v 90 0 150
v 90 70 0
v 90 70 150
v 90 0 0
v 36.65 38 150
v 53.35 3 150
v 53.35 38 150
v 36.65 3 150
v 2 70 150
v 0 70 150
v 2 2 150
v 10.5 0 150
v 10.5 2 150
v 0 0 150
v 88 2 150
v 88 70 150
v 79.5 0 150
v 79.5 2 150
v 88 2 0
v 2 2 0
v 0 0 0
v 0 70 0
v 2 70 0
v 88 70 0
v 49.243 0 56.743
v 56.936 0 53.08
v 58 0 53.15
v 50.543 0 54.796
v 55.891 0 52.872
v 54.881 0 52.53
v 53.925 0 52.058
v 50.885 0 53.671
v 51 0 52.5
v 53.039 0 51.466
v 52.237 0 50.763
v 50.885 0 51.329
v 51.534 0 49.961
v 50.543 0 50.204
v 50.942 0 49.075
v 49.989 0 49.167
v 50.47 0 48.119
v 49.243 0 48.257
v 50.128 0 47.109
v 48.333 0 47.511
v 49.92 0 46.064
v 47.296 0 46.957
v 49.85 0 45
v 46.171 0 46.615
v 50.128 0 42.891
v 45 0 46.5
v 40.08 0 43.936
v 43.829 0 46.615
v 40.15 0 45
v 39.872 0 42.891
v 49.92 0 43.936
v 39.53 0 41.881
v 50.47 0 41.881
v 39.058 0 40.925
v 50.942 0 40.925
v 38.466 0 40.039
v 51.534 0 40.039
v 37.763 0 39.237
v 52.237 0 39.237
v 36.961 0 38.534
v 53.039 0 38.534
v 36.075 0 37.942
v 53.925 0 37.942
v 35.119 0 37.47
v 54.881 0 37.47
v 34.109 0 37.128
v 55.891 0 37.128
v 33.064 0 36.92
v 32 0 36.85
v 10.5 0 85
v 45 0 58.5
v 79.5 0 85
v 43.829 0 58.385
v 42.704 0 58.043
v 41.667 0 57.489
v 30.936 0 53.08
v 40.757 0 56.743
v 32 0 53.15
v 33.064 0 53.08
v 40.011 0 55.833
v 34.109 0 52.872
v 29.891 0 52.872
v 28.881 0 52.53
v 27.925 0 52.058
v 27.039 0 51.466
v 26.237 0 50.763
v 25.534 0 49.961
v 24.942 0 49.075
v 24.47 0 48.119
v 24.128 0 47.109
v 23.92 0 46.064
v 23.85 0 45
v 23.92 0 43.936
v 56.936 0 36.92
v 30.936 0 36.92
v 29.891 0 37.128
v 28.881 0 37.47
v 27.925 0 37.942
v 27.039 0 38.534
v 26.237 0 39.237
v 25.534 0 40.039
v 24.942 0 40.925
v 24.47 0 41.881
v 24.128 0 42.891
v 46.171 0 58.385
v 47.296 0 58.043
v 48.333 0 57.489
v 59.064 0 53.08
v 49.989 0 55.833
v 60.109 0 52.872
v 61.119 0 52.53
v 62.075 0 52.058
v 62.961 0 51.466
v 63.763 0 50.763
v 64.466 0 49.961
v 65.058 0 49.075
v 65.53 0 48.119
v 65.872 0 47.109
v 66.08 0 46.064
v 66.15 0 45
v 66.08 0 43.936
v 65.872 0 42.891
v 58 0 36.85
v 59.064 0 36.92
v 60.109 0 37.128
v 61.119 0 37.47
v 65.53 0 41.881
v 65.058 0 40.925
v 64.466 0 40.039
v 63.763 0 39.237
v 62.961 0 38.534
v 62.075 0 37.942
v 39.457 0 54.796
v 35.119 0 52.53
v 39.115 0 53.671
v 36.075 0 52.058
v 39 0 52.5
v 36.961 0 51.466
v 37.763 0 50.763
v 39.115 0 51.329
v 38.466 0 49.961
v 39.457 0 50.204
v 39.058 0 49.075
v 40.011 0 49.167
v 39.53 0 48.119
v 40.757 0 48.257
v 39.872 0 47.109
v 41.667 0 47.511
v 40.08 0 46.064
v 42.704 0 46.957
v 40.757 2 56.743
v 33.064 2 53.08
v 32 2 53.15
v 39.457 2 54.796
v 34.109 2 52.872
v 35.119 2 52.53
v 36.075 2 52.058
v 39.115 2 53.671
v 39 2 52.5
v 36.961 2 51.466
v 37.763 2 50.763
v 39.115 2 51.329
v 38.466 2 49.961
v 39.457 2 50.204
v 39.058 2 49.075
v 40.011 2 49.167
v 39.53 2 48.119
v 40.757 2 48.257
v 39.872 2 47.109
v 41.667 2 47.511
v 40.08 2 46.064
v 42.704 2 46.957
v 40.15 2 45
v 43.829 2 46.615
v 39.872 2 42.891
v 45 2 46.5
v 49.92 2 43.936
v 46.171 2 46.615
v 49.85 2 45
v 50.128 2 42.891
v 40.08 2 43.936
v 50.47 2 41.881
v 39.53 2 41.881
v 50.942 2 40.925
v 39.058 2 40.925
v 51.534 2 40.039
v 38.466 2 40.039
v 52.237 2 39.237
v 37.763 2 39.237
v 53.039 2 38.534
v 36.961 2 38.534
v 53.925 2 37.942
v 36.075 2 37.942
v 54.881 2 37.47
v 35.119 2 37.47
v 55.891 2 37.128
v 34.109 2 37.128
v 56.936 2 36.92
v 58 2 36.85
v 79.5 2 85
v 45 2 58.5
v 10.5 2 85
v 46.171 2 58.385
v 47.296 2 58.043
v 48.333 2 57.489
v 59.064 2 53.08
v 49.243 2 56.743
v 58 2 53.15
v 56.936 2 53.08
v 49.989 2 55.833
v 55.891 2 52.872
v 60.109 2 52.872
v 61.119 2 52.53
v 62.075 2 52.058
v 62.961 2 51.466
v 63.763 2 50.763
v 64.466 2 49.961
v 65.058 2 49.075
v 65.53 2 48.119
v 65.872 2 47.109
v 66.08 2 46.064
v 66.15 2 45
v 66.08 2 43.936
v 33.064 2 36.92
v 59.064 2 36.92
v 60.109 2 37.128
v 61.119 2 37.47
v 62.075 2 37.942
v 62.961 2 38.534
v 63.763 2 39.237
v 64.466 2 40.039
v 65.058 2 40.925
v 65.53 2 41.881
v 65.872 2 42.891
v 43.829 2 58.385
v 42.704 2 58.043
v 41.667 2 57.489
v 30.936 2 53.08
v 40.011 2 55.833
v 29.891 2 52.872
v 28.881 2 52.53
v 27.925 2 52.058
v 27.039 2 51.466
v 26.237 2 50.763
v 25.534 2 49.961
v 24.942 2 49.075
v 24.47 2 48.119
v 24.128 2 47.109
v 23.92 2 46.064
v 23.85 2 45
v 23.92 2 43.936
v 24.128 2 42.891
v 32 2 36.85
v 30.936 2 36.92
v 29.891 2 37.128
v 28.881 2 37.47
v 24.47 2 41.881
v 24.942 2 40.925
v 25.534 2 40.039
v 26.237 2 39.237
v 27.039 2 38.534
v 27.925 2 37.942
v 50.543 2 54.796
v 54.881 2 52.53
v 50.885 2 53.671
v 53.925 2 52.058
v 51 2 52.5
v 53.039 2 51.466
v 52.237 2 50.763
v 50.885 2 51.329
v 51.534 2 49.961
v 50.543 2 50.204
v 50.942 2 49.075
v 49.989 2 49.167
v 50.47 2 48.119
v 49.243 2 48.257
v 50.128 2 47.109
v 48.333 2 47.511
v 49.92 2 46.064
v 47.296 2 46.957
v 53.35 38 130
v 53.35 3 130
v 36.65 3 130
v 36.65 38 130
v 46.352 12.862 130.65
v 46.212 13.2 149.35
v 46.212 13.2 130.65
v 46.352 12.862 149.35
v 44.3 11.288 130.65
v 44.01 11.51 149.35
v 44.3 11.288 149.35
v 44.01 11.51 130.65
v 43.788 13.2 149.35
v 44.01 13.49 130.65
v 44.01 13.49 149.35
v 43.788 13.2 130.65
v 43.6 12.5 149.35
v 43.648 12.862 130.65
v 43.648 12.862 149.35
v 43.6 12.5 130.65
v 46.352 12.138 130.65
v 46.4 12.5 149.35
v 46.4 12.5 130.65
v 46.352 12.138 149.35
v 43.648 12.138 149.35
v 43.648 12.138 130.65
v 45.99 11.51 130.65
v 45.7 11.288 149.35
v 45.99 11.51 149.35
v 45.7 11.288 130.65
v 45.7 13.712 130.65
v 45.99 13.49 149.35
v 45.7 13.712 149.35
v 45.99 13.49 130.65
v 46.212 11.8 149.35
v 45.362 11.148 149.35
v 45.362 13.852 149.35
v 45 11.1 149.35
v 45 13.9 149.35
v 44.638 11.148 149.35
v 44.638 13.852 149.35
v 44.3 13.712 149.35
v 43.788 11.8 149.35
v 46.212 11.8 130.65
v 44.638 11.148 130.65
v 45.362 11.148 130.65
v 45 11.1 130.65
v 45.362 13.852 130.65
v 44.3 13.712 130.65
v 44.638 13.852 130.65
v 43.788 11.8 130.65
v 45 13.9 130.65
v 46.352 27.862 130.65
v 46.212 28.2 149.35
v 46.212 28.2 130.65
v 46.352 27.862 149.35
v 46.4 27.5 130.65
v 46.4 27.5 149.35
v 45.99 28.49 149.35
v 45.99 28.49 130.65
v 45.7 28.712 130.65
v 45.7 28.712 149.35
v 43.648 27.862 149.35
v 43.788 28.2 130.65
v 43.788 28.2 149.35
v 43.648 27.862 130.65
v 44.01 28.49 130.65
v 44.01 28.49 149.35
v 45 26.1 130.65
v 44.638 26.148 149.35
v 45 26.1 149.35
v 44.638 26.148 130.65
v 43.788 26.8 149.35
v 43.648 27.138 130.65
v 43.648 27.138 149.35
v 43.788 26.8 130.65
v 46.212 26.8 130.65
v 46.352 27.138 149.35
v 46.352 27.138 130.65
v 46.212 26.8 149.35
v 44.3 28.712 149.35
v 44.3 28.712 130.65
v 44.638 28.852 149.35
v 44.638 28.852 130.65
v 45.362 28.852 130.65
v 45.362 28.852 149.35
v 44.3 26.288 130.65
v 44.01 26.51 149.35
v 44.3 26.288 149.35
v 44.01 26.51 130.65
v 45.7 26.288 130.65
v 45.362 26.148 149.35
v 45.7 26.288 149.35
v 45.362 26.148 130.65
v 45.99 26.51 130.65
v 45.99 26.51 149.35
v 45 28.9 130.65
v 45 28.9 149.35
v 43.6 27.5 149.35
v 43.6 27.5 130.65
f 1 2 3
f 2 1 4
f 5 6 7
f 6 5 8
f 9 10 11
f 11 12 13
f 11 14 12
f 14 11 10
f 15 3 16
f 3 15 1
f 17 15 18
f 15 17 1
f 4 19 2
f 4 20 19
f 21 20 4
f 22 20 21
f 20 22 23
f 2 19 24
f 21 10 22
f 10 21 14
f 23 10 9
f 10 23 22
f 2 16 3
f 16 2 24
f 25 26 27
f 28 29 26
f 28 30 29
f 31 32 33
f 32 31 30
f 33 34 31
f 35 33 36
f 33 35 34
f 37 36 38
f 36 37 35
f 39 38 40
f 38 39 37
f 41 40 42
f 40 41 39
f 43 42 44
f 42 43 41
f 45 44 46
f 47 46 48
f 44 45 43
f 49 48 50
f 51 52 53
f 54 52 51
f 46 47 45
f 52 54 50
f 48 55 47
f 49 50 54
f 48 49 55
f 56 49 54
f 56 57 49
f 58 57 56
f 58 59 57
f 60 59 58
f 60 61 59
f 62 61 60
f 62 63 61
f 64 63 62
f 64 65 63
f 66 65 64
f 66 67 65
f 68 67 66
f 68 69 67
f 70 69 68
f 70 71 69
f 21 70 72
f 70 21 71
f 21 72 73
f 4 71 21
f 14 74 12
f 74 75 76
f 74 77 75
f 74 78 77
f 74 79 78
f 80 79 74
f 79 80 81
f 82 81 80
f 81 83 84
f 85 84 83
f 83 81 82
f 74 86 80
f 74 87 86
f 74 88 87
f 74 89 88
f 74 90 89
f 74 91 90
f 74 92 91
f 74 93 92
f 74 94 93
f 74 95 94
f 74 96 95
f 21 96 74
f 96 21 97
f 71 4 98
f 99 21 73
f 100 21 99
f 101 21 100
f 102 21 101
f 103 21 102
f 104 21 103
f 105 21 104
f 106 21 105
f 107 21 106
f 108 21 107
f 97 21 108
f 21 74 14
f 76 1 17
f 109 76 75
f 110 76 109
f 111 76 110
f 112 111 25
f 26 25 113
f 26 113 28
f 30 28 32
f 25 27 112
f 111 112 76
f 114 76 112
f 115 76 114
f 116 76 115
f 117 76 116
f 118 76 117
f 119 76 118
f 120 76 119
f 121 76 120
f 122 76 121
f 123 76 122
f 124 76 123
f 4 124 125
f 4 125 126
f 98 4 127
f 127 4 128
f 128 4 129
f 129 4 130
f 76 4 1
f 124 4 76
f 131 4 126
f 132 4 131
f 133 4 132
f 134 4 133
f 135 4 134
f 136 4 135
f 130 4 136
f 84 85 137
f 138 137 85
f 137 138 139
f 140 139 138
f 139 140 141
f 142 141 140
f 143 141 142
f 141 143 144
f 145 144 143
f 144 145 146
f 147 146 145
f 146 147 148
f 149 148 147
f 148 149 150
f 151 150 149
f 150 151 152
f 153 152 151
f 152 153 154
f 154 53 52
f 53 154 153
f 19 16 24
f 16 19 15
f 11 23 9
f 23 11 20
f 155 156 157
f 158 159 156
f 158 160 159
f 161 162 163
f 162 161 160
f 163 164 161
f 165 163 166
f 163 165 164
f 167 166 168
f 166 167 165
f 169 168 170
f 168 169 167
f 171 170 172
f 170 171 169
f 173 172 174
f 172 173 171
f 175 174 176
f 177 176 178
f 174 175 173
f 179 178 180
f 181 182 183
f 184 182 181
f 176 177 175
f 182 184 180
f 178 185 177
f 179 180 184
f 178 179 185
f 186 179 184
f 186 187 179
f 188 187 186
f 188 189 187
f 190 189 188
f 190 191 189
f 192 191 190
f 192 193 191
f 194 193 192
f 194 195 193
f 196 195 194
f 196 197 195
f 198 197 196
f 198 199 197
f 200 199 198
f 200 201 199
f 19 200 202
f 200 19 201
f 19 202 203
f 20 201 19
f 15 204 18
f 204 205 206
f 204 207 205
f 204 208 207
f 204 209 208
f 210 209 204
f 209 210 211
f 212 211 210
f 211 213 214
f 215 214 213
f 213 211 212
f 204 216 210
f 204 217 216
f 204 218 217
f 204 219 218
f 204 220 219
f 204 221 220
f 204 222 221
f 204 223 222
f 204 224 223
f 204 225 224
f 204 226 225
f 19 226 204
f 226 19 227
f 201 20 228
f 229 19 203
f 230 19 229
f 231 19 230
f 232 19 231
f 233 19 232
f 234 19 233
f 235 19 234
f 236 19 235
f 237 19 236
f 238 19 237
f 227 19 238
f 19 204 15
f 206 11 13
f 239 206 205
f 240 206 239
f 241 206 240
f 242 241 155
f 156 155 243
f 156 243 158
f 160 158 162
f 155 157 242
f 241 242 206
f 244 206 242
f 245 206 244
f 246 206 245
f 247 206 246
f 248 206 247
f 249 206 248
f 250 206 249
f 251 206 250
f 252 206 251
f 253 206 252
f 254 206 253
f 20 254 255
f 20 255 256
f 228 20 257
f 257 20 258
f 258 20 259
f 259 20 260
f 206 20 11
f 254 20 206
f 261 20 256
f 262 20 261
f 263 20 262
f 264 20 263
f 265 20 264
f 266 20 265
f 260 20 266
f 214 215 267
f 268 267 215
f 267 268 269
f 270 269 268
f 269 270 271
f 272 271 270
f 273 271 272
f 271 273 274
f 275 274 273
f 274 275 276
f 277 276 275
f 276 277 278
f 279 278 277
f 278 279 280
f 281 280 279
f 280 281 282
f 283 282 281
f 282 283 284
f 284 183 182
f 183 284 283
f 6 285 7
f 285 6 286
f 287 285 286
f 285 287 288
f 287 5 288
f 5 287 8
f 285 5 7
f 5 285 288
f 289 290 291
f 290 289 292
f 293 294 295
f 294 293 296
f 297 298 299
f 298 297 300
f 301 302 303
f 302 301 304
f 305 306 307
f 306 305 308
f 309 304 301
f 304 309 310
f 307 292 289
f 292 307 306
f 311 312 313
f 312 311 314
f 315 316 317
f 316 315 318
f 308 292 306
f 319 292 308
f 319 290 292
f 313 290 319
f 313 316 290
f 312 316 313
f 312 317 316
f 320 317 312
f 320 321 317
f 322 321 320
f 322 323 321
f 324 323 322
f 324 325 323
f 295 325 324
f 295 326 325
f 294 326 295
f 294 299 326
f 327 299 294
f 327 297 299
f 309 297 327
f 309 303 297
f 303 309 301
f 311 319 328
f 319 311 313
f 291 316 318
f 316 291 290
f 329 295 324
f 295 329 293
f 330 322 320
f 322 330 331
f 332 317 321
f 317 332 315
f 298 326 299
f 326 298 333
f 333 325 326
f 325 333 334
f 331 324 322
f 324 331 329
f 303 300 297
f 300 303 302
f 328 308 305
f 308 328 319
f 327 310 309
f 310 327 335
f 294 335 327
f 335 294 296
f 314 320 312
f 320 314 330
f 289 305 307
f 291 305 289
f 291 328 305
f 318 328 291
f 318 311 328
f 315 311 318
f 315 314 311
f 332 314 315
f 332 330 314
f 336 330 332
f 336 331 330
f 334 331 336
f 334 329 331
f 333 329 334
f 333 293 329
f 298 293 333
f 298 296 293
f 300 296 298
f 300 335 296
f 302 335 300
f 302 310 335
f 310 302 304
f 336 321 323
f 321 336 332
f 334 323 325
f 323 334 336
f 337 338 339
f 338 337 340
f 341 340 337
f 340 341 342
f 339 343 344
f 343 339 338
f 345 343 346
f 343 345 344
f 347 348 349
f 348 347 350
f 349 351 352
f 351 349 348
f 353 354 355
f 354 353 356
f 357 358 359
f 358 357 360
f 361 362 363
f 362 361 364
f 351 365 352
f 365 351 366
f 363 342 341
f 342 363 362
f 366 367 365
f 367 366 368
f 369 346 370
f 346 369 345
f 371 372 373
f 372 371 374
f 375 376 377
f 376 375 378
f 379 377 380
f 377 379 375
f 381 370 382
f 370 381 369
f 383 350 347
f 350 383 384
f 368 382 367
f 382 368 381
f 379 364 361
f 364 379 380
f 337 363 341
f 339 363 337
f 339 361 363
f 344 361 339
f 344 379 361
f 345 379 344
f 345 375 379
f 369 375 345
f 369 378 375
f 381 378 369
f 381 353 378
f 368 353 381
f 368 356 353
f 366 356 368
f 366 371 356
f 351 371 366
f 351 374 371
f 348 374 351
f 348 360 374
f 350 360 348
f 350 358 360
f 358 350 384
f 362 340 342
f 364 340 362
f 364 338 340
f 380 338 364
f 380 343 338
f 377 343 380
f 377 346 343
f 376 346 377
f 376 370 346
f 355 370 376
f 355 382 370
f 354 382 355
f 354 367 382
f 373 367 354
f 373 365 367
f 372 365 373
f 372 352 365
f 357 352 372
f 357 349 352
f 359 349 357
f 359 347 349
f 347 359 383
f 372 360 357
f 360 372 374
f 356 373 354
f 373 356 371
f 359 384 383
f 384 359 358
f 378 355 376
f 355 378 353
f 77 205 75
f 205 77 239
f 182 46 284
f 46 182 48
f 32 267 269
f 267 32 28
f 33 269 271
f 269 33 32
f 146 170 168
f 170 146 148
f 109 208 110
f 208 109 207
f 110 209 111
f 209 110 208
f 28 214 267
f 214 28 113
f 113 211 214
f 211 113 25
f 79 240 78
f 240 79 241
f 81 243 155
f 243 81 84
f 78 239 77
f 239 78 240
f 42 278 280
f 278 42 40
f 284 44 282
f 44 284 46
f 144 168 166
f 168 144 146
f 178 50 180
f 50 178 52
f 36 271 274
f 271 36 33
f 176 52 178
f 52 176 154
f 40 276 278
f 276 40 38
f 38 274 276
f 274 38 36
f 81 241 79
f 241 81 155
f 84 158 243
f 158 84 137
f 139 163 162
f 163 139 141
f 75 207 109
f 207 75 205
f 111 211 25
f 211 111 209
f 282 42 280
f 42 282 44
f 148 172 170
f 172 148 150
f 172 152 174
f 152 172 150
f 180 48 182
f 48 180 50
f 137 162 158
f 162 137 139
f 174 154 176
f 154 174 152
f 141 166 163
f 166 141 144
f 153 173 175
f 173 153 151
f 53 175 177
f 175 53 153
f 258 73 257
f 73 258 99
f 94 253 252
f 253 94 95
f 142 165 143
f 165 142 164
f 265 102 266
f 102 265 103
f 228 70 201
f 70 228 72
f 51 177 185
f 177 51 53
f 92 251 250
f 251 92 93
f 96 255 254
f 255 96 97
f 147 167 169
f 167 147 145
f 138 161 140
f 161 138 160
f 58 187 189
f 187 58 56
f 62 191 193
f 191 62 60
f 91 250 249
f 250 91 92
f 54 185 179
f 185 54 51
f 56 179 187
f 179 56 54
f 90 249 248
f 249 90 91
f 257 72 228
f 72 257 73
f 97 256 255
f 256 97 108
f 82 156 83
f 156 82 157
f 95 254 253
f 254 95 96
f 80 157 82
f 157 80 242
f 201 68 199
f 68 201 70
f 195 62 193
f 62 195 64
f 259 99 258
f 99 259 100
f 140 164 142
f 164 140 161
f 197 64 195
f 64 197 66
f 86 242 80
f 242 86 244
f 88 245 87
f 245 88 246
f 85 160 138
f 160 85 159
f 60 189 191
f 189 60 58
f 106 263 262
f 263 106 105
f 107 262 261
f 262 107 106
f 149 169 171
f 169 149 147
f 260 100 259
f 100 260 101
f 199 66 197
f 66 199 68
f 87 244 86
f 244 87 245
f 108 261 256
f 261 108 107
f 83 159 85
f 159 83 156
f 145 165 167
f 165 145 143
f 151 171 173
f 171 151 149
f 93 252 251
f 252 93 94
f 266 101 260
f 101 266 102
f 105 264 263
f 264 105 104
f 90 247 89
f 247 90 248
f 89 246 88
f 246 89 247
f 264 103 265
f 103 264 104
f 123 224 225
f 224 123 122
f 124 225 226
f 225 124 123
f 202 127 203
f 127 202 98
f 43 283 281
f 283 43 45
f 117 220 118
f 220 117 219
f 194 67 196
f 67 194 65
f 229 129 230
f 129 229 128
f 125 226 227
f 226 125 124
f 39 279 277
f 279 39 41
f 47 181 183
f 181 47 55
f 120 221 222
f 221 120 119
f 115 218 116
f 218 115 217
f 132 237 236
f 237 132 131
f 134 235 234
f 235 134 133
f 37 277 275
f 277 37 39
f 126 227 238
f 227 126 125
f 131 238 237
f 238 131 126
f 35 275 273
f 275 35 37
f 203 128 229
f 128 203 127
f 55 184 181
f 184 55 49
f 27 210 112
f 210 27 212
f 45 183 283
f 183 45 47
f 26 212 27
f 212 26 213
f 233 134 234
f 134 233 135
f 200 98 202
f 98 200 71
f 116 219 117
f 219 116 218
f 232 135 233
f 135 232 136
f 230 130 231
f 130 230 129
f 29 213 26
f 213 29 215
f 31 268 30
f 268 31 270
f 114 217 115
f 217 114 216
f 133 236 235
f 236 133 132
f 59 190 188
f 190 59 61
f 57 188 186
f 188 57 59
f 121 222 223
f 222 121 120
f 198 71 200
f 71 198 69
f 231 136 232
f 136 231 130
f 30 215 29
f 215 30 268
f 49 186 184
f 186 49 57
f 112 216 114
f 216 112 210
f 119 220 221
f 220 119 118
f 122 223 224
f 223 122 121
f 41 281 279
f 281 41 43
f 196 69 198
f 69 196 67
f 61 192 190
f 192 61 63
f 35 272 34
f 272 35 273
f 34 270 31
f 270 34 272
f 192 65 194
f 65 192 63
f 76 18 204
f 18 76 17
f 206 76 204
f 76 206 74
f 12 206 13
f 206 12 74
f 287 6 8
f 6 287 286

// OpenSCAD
// file: common.scad
// common.scad — every dimension in the feeder lives here.
// Change a value, re-run ../check.sh, and every part regrows together.

/* ---------- Printer envelope ---------- */
bed_x = 220;
bed_y = 220;
bed_z = 250;

/* ---------- Material and process ---------- */
wall      = 2.0;    // nominal wall thickness (5 perimeters at 0.4 nozzle)
fit_slide = 0.30;   // clearance for parts that must move against each other
fit_press = 0.15;   // clearance for parts pressed together
$fn       = 96;

/* ---------- Fasteners ---------- */
m3_free = 3.4;      // M3 clearance hole
m3_tap  = 2.8;      // M3 self-tapping into plastic
m4_free = 4.5;

/* ---------- Load cells (VERIFY against the cells you actually buy) ----------
   Figures below are for the common YZC-133 straight bar. Bolt spacing varies
   between suppliers; measure yours before printing the base or the platform. */
cell_l            = 80;
cell_w            = 12.7;
cell_h            = 12.7;
cell_bolt_spacing = 15;   // centre-to-centre, at each end
cell_gap          = 3;    // spacer thickness — the beam MUST be free to flex

/* ---------- Food model ---------- */
kibble_density = 0.40;   // g/cm^3, dry kibble bulk density

/* ---------- Hopper ---------- */
hopper_volume_l = 2.0;
hopper_mouth    = 140;   // inner, square, at the top
hopper_throat   = 55;    // inner, square, at the bottom

// Square frustum volume: V = h/3 * (A1 + A2 + sqrt(A1*A2))
// For squares sqrt(A1*A2) collapses to mouth*throat, so height is exact:
hopper_h = 3 * hopper_volume_l * 1000000 /
           (hopper_mouth*hopper_mouth + hopper_throat*hopper_throat +
            hopper_mouth*hopper_throat);

hopper_run        = (hopper_mouth - hopper_throat) / 2;
hopper_wall_angle = atan(hopper_h / hopper_run);   // from horizontal
hopper_taper_rate = (hopper_mouth - hopper_throat) / hopper_h;
hopper_capacity_g = hopper_volume_l * 1000 * kibble_density;

/* ---------- Drum valve ---------- */
drum_dia       = 50;
drum_len       = 60;
drum_clearance = 0.4;                      // radial
drum_bore      = drum_dia + 2*drum_clearance;
pocket_depth   = 11.3;                     // segment depth of the scoop
shaft_dia      = 6;
shaft_len      = 8;

// Circular-segment maths. OpenSCAD trig is in DEGREES; the segment area
// formula needs the angle in RADIANS, hence the two forms below.
drum_r          = drum_dia / 2;
pocket_theta    = 2 * acos(1 - pocket_depth/drum_r);        // degrees
pocket_theta_r  = pocket_theta * PI / 180;                  // radians
pocket_area     = drum_r*drum_r/2 * (pocket_theta_r - sin(pocket_theta));
pocket_volume   = pocket_area * drum_len;                   // mm^3
sweep_grams     = pocket_volume / 1000 * kibble_density;    // DERIVED, not assumed

/* ---------- Valve housing ---------- */
housing_x = drum_len + 4*wall;      // along the drum axis
housing_y = drum_bore + 4*wall;
housing_z = drum_bore + 4*wall;
outlet_x  = 45;
outlet_y  = 45;

/* ---------- Chute ---------- */
chute_forward = 70;    // how far forward of the tower the food lands
chute_drop    = 90;    // vertical fall from valve outlet to chute exit
chute_exit    = 40;
chute_clear   = 40;    // exit height above the bowl rim — impulse, not load

/* ---------- Bowl and platform ---------- */
bowl_dia     = 140;    // the BOUGHT stainless/ceramic bowl
platform_dia = 150;
platform_t   = 5;
ring_w       = 3;
ring_h       = 8;
bowl_gap     = 6;      // air on every side — the isolation gap

/* ---------- Base and tower ---------- */
base_size = 190;
base_t    = 6;
bay_h     = 28;        // electronics bay height
tower_w   = 90;
tower_d   = 70;
tower_h   = 150;

/* ---------- Head ---------- */
head_tilt   = 30;      // camera, degrees down from horizontal
cam_pcb     = [40, 40, 1.6];
sr04_dia    = 16;
sr04_pitch  = 26;      // centre-to-centre of the two transducers

/* ---------- Derived overall ---------- */
total_h = base_t + bay_h + tower_h + housing_z + hopper_h;

/* ---------- Assertions: the things that silently ruin a print ---------- */
assert(hopper_wall_angle >= 60,
       str("Hopper wall ", hopper_wall_angle, " deg is below 60 - kibble will bridge"));
assert(hopper_h + 2*wall <= bed_z,
       str("Hopper ", hopper_h, " mm exceeds bed Z ", bed_z));
assert(hopper_mouth + 2*wall <= bed_x,
       "Hopper mouth exceeds bed X");
assert(base_size <= bed_x && base_size <= bed_y,
       "Base exceeds bed footprint");
assert(platform_dia <= bed_x, "Bowl platform exceeds bed X");
assert(drum_clearance > 0, "Drum clearance must be positive or the drum seizes");
assert(drum_bore > drum_dia, "Drum bore must exceed drum diameter");
assert(pocket_depth < drum_r,
       "Pocket deeper than the drum radius - the scoop would cut through the axis");
assert(sweep_grams > 6 && sweep_grams < 10,
       str("Sweep delivers ", sweep_grams, " g - outside the 6-10 g design window"));
assert(bowl_gap > 0, "Bowl isolation gap must be positive");
assert(cell_gap > 0, "Load cell needs a flex gap or it reads nothing");
assert(chute_forward + 40 <= bed_y,
       "Bowl arm exceeds bed Y - split it or shorten chute_forward");

/* ---------- Shared geometry ---------- */
// A square frustum, bottom face on the XY plane, centred on Z.
module frustum(bottom, top, h) {
  linear_extrude(height = h, scale = top/bottom)
    square([bottom, bottom], center = true);
}

// A rectangular tube used for the labyrinth lip on the lid and hopper mouth.
module lip(inner, thickness, h) {
  difference() {
    cube([inner + 2*thickness, inner + 2*thickness, h], center = true);
    cube([inner, inner, h + 1], center = true);
  }
}

// Four bolt holes on a square pattern.
module bolt_square(spacing, dia, h) {
  for (i = [0:3])
    rotate([0, 0, 90*i])
      translate([spacing/2, spacing/2, 0])
        cylinder(d = dia, h = h, center = true, $fn = 24);
}

// The cantilever footprint a load cell bolts into: two holes plus a relief slot.
module cell_mount(dia = m3_tap, h = 10) {
  for (y = [-cell_bolt_spacing/2, cell_bolt_spacing/2])
    translate([0, y, 0]) cylinder(d = dia, h = h, center = true, $fn = 24);
}

echo(str("hopper_h = ", hopper_h, " mm"));
echo(str("hopper wall angle = ", hopper_wall_angle, " deg"));
echo(str("hopper capacity = ", hopper_capacity_g, " g"));
echo(str("sweep = ", sweep_grams, " g"));
echo(str("total height = ", total_h, " mm"));
// main file
include <common.scad>

anchor_h = 20;

module tower() {
  difference() {
    union() {
      // Spine — an open C section, printed on its back, no supports needed.
      difference() {
        cube([tower_w, tower_d, tower_h], center = false);
        translate([wall, wall, -1])
          cube([tower_w - 2*wall, tower_d, tower_h + 2], center = false);
      }
      // Load cell anchor for the floating hopper assembly. The FRAME half of
      // the cantilever bolts here; the hopper half bolts to the valve housing.
      translate([tower_w/2 - (cell_w + 2*wall)/2, wall, tower_h - anchor_h])
        cube([cell_w + 2*wall, cell_l * 0.45, anchor_h], center = false);
    }

    // Cell bolt holes in the anchor.
    translate([tower_w/2, wall + cell_l*0.225, tower_h - anchor_h/2])
      cell_mount(m3_tap, cell_w + 2*wall + 2);

    // Cable routes: one for the servo service loop, one for the sensors.
    for (z = [tower_h*0.35, tower_h*0.65])
      translate([tower_w/2, tower_d/2, z])
        rotate([90, 0, 0]) cylinder(d = 12, h = tower_d + 2, center = true, $fn = 32);

    // Chute pass-through in the front face. The chute is frame-mounted and
    // descends across the tower on its way to the bowl; this opening lets it
    // pass without touching anything that is being weighed.
    translate([tower_w/2, wall/2, tower_h - 30])
      cube([outlet_x + 24, wall + 2, 70], center = true);

    // Ultrasonic window on the front face.
    translate([tower_w/2, wall/2, tower_h*0.30])
      rotate([90, 0, 0])
        for (x = [-sr04_pitch/2, sr04_pitch/2])
          translate([x, 0, 0])
            cylinder(d = sr04_dia + fit_slide, h = wall + 2, center = true, $fn = 48);
  }
}

tower();
